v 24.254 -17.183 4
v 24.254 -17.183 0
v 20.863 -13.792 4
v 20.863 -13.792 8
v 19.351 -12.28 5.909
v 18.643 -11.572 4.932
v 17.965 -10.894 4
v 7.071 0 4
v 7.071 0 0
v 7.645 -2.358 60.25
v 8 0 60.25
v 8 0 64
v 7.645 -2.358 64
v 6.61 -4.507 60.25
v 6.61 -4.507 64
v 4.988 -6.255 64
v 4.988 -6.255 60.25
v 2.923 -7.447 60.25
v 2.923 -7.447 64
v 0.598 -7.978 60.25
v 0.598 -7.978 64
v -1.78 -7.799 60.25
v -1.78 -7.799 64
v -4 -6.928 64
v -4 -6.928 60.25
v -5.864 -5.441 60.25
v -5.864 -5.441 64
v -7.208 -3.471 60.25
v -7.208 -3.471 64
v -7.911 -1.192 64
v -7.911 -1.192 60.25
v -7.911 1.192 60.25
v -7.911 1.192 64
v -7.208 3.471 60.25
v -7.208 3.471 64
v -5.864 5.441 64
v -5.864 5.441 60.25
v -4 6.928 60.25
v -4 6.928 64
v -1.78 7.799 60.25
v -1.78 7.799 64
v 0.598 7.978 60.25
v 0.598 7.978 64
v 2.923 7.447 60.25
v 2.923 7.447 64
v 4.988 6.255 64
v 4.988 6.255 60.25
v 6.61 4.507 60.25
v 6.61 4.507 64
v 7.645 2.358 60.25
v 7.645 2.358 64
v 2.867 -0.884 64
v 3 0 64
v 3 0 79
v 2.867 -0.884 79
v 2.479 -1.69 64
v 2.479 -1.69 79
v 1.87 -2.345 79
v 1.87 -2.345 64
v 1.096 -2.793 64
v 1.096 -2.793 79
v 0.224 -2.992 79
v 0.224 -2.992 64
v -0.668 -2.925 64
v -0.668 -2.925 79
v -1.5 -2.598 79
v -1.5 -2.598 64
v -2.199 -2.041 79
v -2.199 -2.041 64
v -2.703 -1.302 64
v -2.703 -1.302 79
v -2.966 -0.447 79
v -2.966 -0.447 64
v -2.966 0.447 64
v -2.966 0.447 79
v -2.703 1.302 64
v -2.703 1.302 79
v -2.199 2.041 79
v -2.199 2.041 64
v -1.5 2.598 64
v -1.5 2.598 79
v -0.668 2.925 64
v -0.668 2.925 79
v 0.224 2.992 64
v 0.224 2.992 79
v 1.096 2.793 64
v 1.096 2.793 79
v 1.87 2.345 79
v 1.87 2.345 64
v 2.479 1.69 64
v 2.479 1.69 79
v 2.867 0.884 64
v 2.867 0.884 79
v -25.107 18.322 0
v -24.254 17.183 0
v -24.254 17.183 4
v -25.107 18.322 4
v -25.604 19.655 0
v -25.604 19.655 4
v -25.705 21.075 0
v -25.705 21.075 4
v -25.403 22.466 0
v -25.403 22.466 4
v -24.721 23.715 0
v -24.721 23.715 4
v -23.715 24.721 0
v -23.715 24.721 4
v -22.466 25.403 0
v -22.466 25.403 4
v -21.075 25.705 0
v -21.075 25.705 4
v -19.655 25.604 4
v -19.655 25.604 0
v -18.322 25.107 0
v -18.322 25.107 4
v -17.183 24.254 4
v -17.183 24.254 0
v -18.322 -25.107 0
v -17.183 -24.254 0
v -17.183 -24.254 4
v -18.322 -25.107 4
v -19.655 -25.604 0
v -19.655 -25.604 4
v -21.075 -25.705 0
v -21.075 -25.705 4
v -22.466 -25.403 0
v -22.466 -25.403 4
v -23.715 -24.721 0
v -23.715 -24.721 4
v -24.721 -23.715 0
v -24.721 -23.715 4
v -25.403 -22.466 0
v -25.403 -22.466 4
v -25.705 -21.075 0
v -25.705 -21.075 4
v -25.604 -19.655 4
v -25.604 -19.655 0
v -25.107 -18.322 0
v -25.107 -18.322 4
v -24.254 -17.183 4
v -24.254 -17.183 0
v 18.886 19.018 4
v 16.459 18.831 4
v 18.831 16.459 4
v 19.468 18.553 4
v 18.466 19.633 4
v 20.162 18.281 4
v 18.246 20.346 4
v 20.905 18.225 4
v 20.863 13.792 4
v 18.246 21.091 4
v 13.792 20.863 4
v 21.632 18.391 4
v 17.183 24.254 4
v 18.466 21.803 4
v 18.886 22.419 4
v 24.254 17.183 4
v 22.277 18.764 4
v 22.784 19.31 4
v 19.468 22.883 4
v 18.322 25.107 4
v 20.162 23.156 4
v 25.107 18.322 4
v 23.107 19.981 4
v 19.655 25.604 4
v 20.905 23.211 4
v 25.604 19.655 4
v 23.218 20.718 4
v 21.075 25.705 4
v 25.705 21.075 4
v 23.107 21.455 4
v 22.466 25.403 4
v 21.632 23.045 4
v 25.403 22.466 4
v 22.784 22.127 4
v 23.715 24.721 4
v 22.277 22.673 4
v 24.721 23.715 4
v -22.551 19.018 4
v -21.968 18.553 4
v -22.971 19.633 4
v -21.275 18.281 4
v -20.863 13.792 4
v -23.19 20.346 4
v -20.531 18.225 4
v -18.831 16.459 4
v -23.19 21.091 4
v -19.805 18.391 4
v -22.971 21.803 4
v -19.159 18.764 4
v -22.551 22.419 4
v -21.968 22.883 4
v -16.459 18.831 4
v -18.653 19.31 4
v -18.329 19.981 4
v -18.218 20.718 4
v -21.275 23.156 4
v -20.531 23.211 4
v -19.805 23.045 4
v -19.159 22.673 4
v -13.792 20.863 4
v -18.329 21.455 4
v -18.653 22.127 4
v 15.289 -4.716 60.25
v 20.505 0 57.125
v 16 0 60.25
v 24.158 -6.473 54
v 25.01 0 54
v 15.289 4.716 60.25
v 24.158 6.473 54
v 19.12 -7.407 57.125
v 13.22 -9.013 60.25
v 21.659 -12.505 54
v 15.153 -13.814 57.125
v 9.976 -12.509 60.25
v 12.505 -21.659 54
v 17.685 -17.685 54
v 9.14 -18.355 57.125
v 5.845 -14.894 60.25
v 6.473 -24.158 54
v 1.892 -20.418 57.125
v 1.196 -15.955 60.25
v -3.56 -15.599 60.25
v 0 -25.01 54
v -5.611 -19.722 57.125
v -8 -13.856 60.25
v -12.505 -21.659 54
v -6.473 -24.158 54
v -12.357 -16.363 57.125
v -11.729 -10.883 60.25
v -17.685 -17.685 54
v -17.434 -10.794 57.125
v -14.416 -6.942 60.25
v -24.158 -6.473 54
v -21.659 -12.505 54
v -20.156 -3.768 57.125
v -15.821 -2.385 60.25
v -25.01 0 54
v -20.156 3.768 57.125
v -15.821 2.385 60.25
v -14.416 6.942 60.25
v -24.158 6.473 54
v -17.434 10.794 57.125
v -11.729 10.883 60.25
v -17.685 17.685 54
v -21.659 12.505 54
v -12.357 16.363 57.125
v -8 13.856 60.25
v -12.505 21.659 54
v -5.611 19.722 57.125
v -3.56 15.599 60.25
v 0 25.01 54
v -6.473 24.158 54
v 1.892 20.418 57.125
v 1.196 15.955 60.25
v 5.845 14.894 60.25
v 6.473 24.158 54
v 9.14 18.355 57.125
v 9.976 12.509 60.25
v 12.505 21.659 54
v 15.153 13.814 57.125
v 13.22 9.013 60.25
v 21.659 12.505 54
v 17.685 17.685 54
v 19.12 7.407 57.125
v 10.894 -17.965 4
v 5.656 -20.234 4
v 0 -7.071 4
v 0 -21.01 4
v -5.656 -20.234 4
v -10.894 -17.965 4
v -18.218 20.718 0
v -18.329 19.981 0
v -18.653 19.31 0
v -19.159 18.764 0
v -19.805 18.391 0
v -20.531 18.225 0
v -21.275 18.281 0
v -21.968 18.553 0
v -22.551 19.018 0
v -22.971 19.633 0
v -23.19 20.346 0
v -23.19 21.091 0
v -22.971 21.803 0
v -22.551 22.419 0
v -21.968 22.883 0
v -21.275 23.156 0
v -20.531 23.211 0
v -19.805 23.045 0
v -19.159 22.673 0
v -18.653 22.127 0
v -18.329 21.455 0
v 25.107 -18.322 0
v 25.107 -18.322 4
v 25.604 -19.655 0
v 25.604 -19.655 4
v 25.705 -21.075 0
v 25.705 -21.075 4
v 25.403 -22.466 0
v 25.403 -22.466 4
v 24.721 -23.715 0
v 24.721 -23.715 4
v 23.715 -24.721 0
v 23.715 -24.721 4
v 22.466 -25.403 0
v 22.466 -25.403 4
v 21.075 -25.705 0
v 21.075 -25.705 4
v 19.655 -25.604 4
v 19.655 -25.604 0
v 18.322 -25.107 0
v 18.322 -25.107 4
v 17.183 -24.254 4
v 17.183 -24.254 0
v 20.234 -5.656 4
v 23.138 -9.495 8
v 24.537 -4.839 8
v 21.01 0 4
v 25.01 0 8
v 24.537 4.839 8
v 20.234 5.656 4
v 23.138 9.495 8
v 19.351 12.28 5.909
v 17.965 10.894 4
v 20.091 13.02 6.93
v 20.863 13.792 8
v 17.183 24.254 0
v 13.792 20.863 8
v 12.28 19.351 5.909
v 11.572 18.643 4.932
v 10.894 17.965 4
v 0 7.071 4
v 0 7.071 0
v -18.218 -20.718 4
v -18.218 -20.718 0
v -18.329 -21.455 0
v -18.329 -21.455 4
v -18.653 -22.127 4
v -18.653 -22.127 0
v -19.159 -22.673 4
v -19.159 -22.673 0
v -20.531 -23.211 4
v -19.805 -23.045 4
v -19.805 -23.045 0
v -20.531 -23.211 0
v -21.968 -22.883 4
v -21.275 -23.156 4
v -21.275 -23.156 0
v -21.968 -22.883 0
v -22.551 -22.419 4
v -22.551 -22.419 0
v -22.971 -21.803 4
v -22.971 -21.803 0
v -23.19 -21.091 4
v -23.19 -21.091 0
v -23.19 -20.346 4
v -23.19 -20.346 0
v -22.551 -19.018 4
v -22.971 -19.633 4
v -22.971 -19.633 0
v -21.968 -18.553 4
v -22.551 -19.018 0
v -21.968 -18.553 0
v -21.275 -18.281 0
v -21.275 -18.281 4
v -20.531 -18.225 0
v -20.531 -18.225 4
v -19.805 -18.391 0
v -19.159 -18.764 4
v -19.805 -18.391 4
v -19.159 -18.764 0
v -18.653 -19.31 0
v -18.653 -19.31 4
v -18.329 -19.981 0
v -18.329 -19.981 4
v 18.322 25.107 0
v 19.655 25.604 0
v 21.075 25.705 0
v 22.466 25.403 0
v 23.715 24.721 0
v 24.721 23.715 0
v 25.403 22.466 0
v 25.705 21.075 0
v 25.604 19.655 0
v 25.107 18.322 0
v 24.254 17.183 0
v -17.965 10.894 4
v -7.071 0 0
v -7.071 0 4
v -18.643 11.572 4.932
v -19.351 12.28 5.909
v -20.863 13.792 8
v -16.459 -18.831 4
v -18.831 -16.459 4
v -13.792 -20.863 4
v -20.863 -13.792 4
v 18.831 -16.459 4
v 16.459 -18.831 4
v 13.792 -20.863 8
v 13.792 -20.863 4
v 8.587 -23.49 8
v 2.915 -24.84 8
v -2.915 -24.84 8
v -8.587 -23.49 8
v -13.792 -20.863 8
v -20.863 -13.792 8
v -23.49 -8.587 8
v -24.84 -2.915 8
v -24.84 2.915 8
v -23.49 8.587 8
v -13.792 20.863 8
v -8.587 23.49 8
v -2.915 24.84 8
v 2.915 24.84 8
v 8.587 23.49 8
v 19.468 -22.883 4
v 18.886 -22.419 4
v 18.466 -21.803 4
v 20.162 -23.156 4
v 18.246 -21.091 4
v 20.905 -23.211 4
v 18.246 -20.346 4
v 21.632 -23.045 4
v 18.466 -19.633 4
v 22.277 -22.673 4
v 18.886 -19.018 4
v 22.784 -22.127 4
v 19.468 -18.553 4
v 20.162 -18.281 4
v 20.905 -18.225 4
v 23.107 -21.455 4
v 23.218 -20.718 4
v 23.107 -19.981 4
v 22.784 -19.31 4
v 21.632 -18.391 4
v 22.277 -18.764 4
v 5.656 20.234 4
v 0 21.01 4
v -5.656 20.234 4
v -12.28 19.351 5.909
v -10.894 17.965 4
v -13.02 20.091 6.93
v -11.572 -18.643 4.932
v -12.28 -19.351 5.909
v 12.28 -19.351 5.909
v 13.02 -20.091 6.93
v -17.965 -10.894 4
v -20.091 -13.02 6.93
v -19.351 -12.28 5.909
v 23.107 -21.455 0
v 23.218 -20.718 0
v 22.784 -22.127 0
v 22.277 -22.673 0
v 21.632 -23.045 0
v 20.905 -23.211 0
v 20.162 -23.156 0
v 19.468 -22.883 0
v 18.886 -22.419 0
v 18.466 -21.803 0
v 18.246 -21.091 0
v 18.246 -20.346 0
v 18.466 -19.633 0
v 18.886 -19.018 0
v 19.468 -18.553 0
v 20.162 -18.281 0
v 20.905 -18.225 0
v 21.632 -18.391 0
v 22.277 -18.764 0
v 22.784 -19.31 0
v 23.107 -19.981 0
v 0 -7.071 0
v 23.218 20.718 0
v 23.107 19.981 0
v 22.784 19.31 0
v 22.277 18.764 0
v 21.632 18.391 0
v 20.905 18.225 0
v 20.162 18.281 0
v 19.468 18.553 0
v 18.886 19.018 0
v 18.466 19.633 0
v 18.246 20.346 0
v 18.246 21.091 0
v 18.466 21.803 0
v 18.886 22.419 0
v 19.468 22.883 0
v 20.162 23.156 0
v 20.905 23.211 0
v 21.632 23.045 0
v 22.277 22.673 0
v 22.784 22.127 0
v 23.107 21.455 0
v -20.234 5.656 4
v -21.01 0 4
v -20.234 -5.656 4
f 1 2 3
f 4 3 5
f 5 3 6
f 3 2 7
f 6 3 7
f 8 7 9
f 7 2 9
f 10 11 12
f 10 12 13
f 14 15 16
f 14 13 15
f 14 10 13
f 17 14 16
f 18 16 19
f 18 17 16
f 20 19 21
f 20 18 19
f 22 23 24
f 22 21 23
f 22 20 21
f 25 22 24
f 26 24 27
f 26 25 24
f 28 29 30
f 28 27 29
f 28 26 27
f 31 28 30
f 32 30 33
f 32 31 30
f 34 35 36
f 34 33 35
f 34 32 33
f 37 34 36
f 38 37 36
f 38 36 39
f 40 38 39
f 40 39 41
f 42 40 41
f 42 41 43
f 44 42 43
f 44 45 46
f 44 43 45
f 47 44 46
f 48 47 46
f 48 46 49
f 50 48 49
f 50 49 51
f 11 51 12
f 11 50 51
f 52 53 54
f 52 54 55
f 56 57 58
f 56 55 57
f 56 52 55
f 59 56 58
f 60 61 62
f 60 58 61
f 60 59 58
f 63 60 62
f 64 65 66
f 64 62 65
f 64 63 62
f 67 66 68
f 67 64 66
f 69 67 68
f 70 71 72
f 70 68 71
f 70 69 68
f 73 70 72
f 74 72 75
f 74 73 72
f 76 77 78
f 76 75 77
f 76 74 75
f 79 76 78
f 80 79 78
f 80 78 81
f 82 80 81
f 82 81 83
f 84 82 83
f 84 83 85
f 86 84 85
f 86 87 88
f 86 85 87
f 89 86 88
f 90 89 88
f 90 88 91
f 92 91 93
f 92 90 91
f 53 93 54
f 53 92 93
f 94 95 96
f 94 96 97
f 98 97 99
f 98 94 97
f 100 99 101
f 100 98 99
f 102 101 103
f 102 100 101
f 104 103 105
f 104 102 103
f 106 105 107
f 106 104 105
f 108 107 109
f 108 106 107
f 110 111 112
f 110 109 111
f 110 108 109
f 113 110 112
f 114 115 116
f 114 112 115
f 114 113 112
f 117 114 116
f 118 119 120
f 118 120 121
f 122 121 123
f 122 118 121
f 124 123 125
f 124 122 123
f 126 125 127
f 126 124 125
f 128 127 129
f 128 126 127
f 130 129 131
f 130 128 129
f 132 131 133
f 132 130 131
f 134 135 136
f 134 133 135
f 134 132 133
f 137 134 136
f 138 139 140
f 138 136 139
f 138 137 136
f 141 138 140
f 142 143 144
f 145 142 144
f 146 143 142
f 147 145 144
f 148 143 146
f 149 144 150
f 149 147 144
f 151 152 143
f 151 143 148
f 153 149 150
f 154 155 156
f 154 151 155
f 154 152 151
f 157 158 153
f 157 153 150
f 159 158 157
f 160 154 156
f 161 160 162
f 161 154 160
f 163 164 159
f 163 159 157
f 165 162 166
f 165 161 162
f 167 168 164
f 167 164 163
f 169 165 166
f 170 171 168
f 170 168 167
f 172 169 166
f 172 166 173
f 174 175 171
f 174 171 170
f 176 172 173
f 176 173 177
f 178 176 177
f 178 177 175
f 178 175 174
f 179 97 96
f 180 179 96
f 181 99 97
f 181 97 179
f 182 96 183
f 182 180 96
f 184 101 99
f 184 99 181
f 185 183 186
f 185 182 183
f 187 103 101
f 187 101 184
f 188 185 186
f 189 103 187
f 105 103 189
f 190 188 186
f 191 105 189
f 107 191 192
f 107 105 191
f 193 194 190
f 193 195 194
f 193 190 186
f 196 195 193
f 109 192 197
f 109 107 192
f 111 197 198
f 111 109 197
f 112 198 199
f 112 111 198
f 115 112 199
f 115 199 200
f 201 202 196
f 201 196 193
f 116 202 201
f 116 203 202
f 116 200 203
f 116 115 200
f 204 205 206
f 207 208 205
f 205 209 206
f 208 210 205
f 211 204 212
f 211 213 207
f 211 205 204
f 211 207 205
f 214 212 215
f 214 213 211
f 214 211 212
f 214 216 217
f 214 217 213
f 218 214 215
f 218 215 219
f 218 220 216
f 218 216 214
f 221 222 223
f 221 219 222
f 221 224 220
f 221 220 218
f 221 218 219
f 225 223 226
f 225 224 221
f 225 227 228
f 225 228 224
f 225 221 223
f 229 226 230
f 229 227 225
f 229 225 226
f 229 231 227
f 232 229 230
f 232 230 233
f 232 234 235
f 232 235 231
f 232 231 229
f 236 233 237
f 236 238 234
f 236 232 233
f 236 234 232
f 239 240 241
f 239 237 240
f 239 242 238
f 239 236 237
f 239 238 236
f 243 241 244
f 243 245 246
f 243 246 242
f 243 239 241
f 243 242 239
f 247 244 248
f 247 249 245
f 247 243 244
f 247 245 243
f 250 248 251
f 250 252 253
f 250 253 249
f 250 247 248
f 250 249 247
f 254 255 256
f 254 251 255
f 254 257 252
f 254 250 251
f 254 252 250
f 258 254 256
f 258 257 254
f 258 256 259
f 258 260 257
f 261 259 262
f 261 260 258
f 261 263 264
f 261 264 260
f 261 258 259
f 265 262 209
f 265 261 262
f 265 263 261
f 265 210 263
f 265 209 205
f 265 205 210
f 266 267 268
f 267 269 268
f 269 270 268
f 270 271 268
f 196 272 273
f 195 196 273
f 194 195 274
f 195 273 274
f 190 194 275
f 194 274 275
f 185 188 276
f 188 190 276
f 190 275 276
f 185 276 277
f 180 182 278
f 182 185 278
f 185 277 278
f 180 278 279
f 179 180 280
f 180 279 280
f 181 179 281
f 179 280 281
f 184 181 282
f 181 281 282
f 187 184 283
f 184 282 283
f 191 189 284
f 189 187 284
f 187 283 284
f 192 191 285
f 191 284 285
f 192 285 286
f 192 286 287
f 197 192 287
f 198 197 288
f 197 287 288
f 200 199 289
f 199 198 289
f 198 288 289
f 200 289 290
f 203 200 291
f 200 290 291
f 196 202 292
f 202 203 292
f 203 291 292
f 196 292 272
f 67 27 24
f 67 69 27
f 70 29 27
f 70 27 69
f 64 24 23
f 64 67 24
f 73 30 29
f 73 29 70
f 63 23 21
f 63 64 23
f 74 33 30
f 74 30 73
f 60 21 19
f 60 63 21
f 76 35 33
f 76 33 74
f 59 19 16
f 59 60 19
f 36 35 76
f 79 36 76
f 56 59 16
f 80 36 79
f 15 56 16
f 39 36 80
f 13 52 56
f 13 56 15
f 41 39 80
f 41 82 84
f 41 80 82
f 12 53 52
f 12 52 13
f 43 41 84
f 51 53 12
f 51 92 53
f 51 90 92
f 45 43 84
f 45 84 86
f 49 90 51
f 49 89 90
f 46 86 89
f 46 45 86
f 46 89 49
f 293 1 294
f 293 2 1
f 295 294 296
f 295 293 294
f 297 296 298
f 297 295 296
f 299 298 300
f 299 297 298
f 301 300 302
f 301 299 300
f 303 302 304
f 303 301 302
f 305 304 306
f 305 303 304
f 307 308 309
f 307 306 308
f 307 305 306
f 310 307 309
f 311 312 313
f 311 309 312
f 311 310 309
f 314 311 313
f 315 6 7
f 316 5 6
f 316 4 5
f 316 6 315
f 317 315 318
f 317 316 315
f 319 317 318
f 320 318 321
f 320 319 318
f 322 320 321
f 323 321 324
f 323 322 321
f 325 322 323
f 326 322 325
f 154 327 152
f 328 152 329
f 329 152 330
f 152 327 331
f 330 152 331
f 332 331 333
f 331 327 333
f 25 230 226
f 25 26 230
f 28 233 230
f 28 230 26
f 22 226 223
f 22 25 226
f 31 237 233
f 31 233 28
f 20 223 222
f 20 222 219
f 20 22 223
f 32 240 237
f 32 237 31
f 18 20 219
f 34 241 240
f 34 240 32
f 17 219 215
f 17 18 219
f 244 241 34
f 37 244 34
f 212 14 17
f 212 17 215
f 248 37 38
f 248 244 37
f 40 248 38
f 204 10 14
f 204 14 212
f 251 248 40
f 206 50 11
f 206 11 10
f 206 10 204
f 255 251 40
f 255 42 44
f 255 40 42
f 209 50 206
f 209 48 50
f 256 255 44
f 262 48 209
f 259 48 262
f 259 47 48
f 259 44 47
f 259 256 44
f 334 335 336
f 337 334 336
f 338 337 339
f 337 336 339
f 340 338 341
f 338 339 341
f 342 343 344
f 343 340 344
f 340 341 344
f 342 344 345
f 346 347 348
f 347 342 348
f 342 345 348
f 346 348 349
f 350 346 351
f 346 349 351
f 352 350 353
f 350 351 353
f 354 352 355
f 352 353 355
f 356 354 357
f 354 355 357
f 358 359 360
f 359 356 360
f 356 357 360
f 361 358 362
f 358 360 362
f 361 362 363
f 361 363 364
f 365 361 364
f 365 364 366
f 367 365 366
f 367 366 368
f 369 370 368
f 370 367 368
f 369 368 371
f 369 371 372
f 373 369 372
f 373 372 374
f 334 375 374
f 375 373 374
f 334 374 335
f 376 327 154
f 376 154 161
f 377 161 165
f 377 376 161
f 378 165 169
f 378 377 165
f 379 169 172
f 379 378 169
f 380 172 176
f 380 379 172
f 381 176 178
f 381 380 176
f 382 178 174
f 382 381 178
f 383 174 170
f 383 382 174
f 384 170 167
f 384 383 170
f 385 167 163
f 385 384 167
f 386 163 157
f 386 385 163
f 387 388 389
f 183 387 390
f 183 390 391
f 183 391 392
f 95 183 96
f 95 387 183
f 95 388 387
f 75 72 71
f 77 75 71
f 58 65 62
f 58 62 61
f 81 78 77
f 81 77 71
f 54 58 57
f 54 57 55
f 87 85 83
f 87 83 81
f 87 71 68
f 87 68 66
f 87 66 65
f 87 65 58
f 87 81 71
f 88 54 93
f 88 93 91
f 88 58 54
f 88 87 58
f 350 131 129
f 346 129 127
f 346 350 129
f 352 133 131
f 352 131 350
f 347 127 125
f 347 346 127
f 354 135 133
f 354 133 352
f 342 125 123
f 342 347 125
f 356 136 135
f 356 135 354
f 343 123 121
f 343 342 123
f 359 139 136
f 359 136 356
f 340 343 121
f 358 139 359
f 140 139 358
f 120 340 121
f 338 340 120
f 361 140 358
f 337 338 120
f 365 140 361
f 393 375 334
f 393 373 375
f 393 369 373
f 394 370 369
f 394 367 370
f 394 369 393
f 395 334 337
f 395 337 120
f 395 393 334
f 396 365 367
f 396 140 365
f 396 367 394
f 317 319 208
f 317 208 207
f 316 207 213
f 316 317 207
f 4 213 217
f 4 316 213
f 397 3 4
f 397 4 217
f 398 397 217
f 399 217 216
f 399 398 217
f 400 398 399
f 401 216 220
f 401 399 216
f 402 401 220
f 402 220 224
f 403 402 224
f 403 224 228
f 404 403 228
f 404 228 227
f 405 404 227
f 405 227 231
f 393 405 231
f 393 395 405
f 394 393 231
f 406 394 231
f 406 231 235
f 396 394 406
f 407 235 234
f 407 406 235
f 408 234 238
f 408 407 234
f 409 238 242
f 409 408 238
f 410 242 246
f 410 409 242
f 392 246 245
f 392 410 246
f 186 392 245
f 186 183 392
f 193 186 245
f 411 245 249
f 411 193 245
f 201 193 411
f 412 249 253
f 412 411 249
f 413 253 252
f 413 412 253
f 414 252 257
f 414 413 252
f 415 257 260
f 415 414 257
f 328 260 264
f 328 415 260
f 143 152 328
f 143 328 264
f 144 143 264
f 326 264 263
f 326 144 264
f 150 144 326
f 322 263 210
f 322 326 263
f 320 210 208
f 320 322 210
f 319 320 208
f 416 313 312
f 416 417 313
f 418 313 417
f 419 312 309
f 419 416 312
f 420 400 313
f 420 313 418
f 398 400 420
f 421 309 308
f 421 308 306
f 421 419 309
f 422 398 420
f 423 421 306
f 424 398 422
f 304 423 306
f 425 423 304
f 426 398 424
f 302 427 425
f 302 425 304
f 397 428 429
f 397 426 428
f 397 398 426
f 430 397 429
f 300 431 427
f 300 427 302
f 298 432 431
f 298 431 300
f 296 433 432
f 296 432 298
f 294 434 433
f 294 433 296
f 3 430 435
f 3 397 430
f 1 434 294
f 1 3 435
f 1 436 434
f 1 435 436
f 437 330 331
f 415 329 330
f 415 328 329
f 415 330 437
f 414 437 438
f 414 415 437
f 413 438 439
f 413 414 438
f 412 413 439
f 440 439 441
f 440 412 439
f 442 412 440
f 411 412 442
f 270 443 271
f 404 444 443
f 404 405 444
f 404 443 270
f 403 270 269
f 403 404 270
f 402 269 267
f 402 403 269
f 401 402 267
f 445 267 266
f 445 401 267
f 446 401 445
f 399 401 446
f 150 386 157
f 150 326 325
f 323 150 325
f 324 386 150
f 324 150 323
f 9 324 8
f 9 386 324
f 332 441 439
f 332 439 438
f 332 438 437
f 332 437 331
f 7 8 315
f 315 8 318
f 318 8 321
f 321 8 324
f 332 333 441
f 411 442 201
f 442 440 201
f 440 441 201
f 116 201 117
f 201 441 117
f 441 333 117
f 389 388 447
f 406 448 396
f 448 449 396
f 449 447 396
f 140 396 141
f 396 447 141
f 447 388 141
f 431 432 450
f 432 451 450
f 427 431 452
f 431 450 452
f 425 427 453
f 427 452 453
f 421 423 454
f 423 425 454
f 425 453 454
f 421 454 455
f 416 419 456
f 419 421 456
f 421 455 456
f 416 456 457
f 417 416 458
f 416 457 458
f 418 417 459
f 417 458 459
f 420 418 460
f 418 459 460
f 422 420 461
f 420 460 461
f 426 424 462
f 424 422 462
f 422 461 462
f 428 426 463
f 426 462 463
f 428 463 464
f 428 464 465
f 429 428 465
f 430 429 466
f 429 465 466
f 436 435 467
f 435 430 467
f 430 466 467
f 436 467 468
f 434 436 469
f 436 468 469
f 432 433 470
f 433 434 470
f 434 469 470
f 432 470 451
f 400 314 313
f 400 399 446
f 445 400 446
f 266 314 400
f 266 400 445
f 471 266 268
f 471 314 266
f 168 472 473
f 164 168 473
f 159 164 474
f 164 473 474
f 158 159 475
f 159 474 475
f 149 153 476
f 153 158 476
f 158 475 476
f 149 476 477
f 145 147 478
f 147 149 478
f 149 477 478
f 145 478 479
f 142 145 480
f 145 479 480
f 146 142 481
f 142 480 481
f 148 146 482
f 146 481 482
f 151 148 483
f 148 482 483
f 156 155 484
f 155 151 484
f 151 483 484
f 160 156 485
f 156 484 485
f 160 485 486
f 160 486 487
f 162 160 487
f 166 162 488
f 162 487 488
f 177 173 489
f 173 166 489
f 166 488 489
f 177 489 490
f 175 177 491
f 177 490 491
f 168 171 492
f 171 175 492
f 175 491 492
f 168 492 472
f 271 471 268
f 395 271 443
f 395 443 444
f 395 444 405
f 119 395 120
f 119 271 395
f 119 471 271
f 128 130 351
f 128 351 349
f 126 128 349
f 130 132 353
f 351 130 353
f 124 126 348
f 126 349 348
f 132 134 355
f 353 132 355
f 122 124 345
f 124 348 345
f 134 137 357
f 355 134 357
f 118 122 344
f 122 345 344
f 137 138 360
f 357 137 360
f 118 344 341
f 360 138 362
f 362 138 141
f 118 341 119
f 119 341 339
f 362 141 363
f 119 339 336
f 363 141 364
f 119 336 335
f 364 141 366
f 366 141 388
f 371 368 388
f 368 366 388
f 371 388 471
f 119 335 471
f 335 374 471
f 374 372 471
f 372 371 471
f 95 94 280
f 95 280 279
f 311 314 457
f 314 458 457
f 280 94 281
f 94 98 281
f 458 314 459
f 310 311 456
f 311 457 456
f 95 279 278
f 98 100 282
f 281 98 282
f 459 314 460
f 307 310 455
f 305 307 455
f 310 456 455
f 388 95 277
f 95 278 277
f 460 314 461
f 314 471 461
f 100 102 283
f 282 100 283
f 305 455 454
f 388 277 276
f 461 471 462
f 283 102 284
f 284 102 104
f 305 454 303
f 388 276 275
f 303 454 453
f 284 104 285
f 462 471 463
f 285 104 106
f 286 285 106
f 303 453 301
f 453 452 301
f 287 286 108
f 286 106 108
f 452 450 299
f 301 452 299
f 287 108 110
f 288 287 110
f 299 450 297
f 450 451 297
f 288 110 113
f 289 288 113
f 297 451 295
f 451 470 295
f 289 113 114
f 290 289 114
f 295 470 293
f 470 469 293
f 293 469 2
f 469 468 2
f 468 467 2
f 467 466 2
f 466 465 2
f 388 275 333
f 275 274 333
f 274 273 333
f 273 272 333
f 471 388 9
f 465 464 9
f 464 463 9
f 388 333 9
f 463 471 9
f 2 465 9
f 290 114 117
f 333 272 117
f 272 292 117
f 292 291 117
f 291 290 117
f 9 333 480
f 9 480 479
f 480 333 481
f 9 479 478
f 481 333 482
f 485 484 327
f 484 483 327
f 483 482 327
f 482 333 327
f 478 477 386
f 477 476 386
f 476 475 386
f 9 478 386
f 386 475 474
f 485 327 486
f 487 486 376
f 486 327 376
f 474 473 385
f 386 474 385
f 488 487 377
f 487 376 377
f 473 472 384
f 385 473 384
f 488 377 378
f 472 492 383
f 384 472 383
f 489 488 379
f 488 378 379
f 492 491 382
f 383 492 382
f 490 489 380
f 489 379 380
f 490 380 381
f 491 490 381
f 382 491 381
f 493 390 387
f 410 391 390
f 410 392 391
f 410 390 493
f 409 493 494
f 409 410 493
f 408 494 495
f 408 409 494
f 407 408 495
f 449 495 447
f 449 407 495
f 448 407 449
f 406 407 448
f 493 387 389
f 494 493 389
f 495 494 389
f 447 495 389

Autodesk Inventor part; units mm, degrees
ref_plane "YZ Plane" through (0, 0, 0) normal (1, 0, 0) x (0, 1, 0)
ref_plane "XZ Plane" through (0, 0, 0) normal (0, 1, 0) x (-1, 0, 0)
sketch "Sketch1" plane through (0, 0, 0) normal (0, 0, 1) x (1, 0, 0)
  line L0 (0, 0) -> (-20.7182, 20.7182) construction
  line L1 (7.0711, 0) -> (29.3, 0) construction
  line L2 (0, 0) -> (20.7182, 20.7182) construction
  line L3 (0, 0) -> (29.3, 0) construction
  line L4 (-20.7182, 20.7182) -> (20.7182, 20.7182) construction
  circle A0 centre (-20.7182, 20.7182) radius 2.5
  circle A1 centre (20.7182, 20.7182) radius 2.5
  circle A2 centre (-20.7182, -20.7182) radius 2.5
  circle A3 centre (20.7182, -20.7182) radius 2.5
  arc A4 (-24.2538, -17.1827) -> (-17.1827, -24.2538) centre (-20.7182, -20.7182) ccw
  line L5 (20.7182, 20.7182) -> (13.788, 27.6485) construction
  arc A5 (24.2538, 17.1827) -> (17.1827, 24.2538) centre (20.7182, 20.7182) ccw
  arc A6 (-17.1827, 24.2538) -> (-24.2538, 17.1827) centre (-20.7182, 20.7182) ccw
  arc A7 (17.1827, -24.2538) -> (24.2538, -17.1827) centre (20.7182, -20.7182) ccw
  line L6 (17.1827, 24.2538) -> (0, 7.0711)
  line L7 (-7.0711, 0) -> (-24.2538, -17.1827)
  line L8 (24.2538, -17.1827) -> (7.0711, 0)
  line L9 (0, 7.0711) -> (-17.1827, 24.2538)
  line L10 (24.2538, 17.1827) -> (7.0711, 0)
  line L11 (0, -7.0711) -> (-17.1827, -24.2538)
  line L12 (17.1827, -24.2538) -> (0, -7.0711)
  line L13 (-7.0711, 0) -> (-24.2538, 17.1827)
  dimension "d0" = 29.3
  dimension "d1" = 135
  dimension "d2" = 29.3
  dimension "d3" = 45
  dimension "d4" = 2.5
  dimension "d5" = 2.5
  dimension "d6" = 5
  dimension "d7" = 5
extrude "Extrusion1" add sketch "Sketch1" along normal blind 4
sketch "Sketch2" plane through (0, 0, 4) normal (0, 0, 1) x (1, 0, 0)
  circle A0 centre (0, 0) radius 25.01
  dimension "d10" = 25.01
extrude "Extrusion2" add sketch "Sketch2" along normal blind 50
chamfer "Chamfer1" distance 4 angle 45 4 edges at (23.9509, 7.201, 4) (0, -25.01, 4) (-25.01, 0, 4) (0, 25.01, 4)
sketch "Sketch3" plane through (0, 0, 54) normal (0, 0, 1) x (1, 0, 0)
  line L0 (0, 0) -> (25.01, 0)
  circle A0 centre (0, 0) radius 25.01 projected
sketch "Sketch4" plane through (0, 0, 0) normal (0, 0, -1) x (-1, 0, 0)
  point P0 (0, 0)
  point P1 (0, 0)
ref_plane "Work Plane1" through (0, 0, 0) normal (0, 1, 0) x (0, 0, 1)
sketch "Sketch5" plane through (0, 0, 0) normal (0, 1, 0) x (0, 0, 1)
  line L0 (54, -25.01) -> (54, 25.01) projected
  line L1 (54, 0) -> (79, 0)
  line L2 (79, 0) -> (79, 3)
  line L3 (79, 3) -> (64, 3)
  line L4 (64, 3) -> (64, 8)
  line L5 (64, 8) -> (60.25, 8)
  line L6 (60.25, 8) -> (60.25, 16)
  line L7 (60.25, 16) -> (54, 25.01)
  point P0 (0, 0)
  dimension "d16" = 25
  dimension "d17" = 3
  dimension "d18" = 15
  dimension "d19" = 5
  dimension "d20" = 3.75
  dimension "d21" = 8
revolve "Revolution1" add sketch "Sketch5" angle 360 about axis through (0, 0, 54) along (0, 0, 1)
properties part number "Motor Turnigy G60 500kv"
